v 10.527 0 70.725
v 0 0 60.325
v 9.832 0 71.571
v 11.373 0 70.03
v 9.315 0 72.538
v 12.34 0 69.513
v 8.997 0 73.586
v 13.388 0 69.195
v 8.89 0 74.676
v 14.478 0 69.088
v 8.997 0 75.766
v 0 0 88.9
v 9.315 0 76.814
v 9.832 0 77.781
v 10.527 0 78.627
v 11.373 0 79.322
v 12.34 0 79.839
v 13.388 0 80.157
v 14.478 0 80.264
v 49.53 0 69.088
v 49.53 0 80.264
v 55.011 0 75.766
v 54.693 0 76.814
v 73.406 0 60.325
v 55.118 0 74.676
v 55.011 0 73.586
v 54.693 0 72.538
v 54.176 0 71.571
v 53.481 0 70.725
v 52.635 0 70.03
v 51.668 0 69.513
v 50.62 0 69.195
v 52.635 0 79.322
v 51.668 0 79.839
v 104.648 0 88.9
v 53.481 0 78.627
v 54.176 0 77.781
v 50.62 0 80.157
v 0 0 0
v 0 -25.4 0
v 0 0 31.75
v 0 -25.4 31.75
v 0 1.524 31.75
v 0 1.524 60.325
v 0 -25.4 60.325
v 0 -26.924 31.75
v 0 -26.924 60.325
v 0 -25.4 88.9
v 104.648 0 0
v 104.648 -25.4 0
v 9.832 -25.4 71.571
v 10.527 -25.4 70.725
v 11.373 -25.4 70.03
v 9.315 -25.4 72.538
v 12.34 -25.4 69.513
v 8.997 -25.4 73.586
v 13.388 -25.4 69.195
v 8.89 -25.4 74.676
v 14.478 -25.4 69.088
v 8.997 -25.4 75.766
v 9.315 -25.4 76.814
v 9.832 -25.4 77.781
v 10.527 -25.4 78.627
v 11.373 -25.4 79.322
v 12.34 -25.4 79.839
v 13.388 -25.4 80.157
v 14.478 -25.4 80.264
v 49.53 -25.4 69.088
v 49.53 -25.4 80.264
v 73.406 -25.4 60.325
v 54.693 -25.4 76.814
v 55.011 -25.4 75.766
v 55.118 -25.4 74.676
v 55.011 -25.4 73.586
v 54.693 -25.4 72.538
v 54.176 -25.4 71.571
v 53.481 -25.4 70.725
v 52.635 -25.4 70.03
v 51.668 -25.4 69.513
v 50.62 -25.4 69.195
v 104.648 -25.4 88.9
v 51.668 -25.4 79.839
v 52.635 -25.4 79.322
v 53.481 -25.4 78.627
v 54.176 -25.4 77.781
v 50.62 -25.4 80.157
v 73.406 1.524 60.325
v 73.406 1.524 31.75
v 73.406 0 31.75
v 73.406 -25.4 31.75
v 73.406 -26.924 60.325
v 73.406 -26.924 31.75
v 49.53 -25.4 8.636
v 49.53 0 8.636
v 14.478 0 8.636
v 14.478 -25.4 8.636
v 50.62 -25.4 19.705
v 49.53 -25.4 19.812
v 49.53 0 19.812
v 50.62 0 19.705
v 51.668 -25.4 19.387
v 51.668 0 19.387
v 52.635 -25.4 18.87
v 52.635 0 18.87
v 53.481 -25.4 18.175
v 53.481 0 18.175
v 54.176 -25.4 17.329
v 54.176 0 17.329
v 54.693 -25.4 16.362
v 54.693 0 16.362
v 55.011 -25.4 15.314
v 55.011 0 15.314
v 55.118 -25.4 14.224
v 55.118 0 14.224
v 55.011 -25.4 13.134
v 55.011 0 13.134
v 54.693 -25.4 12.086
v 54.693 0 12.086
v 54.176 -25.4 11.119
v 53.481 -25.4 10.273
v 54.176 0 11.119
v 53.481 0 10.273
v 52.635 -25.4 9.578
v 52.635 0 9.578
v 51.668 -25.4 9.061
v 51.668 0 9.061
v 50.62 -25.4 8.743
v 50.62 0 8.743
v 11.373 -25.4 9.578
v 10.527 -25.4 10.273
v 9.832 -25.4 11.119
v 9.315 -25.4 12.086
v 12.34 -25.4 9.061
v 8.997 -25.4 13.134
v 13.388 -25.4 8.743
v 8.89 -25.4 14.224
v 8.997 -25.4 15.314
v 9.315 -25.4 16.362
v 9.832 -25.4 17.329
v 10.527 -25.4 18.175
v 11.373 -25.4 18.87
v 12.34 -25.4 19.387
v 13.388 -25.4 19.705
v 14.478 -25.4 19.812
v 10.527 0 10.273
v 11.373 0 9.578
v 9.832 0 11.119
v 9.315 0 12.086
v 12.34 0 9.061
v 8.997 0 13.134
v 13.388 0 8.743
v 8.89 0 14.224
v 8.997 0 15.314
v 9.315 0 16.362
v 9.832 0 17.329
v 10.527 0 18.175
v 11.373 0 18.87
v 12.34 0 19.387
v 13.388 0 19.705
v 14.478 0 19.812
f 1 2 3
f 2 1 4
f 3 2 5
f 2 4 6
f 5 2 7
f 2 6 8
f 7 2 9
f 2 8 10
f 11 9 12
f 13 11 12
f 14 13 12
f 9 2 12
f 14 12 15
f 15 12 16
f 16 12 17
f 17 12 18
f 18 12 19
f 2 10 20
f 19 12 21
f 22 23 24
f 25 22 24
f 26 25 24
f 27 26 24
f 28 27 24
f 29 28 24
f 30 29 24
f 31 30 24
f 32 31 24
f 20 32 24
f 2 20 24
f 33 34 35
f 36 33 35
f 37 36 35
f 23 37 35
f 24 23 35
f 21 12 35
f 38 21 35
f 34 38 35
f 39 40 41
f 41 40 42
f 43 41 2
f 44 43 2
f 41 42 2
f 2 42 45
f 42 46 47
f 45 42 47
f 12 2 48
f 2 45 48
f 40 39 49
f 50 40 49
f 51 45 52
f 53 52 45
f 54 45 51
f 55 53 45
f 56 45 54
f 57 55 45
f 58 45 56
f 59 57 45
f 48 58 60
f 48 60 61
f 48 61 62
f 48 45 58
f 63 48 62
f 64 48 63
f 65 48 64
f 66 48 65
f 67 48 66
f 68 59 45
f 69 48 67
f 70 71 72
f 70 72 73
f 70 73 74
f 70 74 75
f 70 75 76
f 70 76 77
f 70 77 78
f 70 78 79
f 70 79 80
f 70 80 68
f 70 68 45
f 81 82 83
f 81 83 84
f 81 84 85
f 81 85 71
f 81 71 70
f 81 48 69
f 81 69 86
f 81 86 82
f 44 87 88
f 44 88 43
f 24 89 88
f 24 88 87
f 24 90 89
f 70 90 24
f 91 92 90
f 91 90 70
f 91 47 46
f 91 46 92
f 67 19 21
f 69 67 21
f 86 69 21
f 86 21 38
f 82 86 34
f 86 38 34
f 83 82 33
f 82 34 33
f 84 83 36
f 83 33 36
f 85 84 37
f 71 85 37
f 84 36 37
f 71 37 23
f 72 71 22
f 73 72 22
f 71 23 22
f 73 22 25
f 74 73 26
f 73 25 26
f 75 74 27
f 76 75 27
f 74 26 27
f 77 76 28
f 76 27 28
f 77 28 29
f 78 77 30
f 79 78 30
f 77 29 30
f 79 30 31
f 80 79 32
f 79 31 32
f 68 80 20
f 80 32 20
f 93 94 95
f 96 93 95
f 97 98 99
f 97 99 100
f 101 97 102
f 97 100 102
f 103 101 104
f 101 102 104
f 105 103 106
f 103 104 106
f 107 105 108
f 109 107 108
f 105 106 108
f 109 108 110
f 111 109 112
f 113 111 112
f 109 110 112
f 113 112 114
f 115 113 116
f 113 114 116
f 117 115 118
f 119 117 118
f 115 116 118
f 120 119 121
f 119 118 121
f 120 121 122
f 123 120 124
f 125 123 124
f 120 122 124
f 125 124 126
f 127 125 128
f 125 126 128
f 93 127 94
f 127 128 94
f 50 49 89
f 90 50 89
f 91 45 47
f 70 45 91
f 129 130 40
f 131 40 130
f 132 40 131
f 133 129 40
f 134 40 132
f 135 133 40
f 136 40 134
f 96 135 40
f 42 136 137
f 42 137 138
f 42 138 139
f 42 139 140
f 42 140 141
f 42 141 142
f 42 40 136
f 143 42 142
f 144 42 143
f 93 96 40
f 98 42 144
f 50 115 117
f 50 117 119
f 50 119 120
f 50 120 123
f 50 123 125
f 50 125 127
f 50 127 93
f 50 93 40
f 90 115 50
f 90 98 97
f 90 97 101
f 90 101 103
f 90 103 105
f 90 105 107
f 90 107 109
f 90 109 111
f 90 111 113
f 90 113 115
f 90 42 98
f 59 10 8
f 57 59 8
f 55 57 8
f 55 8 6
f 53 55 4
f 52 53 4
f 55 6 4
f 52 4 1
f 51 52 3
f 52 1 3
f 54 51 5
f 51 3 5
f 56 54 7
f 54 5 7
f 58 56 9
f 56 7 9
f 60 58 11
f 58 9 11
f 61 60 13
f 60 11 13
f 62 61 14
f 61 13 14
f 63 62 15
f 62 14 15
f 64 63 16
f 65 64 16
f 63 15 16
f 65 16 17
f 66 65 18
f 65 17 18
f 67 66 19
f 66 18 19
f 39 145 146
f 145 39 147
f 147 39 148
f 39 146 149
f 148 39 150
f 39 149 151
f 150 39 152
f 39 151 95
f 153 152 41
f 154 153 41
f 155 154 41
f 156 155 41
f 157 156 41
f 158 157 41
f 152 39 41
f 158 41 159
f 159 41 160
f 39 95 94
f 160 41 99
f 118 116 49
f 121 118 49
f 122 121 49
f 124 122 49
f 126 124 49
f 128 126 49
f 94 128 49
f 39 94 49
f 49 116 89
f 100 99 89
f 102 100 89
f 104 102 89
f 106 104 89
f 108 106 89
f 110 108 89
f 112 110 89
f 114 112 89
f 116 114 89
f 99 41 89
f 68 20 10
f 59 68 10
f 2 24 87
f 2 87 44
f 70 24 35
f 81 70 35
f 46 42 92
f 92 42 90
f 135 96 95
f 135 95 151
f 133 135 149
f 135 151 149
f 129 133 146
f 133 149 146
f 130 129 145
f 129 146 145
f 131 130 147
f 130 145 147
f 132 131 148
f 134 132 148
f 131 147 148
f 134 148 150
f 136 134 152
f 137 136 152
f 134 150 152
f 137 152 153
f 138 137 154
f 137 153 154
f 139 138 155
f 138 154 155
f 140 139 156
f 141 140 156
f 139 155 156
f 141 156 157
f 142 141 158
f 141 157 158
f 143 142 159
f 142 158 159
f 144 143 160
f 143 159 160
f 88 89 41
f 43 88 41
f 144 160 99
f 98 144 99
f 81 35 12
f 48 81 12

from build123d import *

# Parameters (mm, degrees)
F0_W     = 73.406
F0_H     = 28.575
F1_DEPTH = 25.4
F2_W     = 73.406
F2_H     = 28.575
F3_DEPTH = 1.524
F4_W     = 73.406
F4_H     = 28.575
F5_DEPTH = 1.524


with BuildPart() as f1:
    # F0 (on Front) → F1 (new body)
    with BuildSketch(Plane.XZ):
        Polygon((0, 31.75), (0, 0), (104.648, 0), (73.406, 31.75), align=None)
        with BuildLine():
            Line((49.53, 8.636), (14.478, 8.636))
            ThreePointArc((14.478, 8.636), (8.89, 14.224), (14.478, 19.812))
            Line((14.478, 19.812), (49.53, 19.812))
            ThreePointArc((49.53, 19.812), (55.118, 14.224), (49.53, 8.636))
        make_face(mode=Mode.SUBTRACT)
        with Locations((36.703, 46.0375)):
            Rectangle(F0_W, F0_H)
        Polygon((0, 88.9), (0, 60.325), (73.406, 60.325), (104.648, 88.9), align=None)
        with BuildLine():
            Line((49.53, 69.088), (14.478, 69.088))
            ThreePointArc((14.478, 69.088), (8.89, 74.676), (14.478, 80.264))
            Line((14.478, 80.264), (49.53, 80.264))
            ThreePointArc((49.53, 80.264), (55.118, 74.676), (49.53, 69.088))
        make_face(mode=Mode.SUBTRACT)
    extrude(amount=F1_DEPTH)

    # F2 (on face) → F3 (join)
    with BuildSketch(Plane.XZ.offset(25.4)):
        with Locations((36.703, 46.0375)):
            Rectangle(F2_W, F2_H)
    extrude(amount=F3_DEPTH)

    # F4 (on face) → F5 (join)
    with BuildSketch(Plane(origin=(0, 0, 0), x_dir=(-1, 0, 0), z_dir=(0, 1, 0))):
        with Locations((-36.703, 46.0375)):
            Rectangle(F4_W, F4_H)
    extrude(amount=F5_DEPTH)


solid = f1.part
